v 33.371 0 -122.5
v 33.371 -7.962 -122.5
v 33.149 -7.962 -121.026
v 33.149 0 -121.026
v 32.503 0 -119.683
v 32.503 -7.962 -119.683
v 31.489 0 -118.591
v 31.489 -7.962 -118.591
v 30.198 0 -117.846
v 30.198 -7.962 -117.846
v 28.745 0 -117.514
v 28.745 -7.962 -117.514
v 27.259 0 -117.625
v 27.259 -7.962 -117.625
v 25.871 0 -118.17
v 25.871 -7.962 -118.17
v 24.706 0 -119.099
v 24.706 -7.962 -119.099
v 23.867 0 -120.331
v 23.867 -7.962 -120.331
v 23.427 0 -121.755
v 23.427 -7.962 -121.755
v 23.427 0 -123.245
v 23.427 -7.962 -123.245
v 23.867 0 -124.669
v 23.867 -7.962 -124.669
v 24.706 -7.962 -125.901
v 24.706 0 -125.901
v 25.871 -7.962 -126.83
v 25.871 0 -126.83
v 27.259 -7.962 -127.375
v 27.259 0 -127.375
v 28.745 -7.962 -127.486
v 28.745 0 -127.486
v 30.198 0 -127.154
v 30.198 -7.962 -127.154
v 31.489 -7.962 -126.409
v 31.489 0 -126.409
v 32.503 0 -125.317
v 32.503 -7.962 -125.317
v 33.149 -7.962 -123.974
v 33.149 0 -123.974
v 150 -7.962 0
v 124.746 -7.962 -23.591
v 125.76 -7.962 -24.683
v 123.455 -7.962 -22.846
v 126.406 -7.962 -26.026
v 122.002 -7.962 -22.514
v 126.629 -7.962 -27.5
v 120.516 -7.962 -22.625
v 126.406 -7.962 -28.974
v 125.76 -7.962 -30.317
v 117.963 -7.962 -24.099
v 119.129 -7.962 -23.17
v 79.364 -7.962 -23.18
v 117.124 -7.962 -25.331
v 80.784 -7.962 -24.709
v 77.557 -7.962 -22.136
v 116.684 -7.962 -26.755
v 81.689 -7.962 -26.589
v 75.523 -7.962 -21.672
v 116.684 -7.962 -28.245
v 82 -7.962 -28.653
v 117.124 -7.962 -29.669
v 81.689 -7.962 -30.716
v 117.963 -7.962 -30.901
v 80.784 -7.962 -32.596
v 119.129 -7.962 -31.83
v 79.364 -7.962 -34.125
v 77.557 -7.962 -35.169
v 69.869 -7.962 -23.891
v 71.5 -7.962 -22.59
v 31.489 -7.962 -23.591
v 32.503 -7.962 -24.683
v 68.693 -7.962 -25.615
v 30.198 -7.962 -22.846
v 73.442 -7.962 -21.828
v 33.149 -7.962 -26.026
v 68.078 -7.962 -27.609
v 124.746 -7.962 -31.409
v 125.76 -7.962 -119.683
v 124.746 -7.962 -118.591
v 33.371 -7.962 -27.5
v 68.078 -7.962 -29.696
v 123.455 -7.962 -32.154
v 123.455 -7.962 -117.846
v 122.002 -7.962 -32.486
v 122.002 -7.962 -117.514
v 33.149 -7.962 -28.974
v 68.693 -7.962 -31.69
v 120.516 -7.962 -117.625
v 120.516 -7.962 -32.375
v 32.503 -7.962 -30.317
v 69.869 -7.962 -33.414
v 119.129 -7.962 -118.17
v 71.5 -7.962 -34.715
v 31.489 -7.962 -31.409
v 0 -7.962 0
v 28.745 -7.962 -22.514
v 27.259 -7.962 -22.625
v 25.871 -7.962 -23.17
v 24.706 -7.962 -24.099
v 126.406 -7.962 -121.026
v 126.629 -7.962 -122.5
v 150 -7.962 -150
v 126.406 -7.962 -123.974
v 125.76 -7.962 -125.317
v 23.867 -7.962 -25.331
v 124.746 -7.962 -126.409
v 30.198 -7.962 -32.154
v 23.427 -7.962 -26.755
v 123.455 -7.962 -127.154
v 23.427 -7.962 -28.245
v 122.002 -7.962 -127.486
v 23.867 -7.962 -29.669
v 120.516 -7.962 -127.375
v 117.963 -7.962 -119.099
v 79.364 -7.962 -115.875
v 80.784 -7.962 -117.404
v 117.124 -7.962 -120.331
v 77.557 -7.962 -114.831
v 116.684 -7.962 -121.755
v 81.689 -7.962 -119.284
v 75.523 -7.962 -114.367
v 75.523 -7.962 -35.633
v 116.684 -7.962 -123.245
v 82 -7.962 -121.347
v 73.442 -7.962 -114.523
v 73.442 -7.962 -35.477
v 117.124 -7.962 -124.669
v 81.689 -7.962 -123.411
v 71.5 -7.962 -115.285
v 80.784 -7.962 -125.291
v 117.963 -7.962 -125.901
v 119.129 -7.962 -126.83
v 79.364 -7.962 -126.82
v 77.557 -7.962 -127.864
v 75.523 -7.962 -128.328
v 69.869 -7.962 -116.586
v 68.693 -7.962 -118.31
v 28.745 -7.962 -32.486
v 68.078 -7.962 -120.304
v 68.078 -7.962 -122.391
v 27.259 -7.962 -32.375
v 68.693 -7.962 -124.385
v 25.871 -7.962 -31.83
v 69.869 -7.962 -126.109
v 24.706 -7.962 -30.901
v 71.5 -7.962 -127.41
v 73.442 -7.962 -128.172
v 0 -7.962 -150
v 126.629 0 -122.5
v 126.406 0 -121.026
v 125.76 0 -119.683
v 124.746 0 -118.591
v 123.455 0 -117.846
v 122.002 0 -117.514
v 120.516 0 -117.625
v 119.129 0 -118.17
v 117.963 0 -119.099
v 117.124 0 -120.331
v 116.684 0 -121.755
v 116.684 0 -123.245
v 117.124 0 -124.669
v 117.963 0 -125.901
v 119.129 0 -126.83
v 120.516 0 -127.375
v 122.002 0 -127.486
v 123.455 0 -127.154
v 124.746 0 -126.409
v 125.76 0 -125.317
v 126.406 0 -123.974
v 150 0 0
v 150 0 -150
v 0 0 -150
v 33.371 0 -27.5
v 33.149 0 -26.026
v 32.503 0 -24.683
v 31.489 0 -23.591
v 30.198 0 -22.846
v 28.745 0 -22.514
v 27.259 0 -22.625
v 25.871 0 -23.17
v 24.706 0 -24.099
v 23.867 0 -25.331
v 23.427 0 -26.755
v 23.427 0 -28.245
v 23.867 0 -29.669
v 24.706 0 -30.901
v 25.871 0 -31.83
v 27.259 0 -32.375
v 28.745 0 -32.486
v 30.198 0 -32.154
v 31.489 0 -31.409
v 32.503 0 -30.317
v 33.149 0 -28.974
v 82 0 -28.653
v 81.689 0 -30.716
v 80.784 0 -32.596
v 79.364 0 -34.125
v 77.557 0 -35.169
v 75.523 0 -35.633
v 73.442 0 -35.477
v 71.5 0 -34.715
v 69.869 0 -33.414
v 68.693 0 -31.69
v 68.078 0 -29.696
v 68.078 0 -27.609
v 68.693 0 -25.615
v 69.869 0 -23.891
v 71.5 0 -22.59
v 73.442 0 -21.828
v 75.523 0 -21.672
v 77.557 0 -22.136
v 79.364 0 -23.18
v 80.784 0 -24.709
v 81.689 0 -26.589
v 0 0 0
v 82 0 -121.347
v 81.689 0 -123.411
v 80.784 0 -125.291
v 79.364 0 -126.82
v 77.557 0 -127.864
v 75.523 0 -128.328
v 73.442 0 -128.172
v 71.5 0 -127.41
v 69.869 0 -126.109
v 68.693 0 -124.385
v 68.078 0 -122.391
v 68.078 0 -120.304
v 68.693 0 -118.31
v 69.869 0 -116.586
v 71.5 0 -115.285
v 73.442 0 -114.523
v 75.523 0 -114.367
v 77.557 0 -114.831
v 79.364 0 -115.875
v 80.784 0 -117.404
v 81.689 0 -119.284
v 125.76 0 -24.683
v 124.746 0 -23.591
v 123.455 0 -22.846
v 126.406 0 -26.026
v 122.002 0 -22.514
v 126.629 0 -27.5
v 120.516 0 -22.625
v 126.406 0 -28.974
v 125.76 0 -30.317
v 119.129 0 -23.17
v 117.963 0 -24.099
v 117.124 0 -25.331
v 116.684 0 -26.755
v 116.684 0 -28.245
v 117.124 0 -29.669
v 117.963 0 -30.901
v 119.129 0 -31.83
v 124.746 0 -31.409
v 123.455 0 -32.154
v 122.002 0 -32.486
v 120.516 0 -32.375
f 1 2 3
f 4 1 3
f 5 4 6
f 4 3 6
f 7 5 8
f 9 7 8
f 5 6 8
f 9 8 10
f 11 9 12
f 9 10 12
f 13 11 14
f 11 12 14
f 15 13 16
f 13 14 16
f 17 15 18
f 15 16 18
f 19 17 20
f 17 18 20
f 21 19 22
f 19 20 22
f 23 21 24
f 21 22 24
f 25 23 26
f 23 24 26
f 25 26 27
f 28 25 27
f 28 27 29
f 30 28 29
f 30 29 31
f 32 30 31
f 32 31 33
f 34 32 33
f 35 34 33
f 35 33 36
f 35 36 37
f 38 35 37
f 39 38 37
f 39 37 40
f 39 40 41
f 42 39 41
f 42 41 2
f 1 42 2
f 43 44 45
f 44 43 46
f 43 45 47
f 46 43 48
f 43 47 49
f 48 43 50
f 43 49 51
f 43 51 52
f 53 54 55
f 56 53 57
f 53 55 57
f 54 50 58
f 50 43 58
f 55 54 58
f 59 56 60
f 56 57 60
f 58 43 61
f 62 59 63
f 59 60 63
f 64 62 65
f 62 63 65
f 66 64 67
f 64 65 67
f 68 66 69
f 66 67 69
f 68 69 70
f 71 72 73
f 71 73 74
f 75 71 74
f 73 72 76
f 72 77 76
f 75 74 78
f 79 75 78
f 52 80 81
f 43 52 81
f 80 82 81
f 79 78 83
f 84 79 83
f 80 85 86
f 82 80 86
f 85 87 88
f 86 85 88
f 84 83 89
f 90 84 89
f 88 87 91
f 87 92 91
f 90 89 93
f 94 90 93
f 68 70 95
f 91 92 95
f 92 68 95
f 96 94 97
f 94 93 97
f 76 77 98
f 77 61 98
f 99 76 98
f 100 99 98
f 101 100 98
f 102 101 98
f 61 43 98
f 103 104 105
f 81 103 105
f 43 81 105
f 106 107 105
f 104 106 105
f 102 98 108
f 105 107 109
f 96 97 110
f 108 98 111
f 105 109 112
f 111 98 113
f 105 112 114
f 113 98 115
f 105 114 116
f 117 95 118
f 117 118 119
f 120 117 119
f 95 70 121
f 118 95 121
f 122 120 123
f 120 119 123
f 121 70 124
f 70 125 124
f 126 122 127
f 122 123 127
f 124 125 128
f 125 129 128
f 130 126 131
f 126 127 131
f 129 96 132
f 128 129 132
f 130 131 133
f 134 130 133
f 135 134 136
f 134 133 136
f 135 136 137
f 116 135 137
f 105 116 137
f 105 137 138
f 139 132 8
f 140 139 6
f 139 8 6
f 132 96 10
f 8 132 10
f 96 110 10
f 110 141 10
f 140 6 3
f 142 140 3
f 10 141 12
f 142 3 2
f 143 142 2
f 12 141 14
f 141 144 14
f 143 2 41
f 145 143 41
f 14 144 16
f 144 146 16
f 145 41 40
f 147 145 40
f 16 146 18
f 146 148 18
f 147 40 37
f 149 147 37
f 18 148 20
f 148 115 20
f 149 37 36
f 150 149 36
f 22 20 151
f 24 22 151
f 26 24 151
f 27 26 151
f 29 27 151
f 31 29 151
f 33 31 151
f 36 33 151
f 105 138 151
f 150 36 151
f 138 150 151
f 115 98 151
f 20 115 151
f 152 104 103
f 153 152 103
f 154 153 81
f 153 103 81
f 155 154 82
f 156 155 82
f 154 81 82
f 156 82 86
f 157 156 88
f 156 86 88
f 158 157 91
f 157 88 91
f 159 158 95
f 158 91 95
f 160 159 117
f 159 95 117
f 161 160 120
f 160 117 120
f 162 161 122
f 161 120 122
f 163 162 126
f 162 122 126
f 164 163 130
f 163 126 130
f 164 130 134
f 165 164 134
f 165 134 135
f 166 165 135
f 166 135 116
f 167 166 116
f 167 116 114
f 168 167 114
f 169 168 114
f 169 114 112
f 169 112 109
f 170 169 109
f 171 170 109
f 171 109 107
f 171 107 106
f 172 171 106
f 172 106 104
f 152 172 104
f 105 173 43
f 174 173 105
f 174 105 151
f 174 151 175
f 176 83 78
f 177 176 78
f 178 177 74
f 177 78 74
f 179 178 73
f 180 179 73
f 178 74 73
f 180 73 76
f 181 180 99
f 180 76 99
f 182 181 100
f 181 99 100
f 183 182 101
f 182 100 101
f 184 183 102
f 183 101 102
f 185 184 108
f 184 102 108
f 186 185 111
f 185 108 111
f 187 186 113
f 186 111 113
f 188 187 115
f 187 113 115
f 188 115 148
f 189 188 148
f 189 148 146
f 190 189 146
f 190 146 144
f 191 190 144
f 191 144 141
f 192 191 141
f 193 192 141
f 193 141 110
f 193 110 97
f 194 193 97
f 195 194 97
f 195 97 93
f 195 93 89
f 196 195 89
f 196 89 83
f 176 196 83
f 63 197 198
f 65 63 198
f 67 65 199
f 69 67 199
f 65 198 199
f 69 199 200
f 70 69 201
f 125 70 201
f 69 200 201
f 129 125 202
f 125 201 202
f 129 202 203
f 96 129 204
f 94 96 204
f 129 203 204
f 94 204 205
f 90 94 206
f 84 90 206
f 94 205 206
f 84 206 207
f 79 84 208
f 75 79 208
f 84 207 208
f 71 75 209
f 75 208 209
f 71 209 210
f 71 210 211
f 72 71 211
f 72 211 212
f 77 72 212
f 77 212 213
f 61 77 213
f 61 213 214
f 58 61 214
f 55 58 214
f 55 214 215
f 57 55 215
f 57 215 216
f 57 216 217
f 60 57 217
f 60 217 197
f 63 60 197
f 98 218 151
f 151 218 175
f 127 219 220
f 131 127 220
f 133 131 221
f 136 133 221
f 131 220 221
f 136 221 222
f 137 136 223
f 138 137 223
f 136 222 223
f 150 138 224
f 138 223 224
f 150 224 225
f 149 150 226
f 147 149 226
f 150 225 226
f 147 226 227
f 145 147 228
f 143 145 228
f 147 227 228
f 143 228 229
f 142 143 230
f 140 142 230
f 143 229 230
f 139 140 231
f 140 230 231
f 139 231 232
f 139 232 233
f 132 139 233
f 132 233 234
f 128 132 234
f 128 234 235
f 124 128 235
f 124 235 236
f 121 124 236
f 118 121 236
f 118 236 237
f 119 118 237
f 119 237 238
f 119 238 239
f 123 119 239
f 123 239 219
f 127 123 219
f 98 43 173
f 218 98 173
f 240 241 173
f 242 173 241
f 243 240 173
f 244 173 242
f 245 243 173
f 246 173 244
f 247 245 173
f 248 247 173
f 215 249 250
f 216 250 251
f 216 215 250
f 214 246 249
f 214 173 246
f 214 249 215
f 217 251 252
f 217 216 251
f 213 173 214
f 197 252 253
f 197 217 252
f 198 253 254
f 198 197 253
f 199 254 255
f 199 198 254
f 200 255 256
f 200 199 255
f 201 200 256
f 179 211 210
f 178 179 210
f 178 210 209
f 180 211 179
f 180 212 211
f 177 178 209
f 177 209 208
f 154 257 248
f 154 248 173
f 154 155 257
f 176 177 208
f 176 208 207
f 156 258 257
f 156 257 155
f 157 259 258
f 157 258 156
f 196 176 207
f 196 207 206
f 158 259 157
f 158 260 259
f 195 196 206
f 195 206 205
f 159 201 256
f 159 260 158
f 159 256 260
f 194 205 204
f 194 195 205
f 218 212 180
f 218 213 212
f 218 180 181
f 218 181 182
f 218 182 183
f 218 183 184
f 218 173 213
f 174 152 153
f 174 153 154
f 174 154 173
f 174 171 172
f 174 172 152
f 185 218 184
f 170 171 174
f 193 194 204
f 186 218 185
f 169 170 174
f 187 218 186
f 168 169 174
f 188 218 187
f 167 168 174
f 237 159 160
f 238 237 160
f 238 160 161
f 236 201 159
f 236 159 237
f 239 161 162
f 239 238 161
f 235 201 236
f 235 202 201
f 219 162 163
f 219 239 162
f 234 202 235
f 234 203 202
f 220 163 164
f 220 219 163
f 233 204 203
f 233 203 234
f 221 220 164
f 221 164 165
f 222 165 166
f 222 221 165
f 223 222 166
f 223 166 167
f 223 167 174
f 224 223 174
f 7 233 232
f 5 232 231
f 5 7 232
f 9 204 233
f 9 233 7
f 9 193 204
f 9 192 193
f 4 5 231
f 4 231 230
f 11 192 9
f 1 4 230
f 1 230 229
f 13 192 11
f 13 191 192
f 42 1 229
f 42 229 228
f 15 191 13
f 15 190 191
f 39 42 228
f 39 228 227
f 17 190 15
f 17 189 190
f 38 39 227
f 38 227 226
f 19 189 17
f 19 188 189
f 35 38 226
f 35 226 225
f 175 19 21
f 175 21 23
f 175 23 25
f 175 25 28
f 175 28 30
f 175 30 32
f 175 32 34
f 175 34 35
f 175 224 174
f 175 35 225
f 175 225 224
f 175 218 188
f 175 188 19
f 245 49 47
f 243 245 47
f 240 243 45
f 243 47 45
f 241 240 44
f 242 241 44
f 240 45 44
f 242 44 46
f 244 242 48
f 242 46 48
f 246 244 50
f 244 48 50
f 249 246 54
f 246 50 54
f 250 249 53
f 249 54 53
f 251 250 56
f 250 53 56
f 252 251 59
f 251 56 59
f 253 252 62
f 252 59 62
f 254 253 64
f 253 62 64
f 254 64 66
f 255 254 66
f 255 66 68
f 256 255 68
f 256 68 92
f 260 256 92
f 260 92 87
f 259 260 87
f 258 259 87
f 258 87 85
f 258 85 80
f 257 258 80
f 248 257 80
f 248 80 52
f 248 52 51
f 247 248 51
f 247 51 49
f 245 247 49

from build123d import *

# Parameters (mm, degrees)
SKETCH1_W           = 150
SKETCH1_H           = 7.962213225
BOSS_EXTRUDE1_DEPTH = 150
SKETCH2_R           = 7
CUT_EXTRUDE1_DEPTH  = 8.962213225
SKETCH3_R           = 5
CUT_EXTRUDE2_DEPTH  = 8.962213225


with BuildPart() as part:
    # Sketch1 → Boss-Extrude1 (new body)
    with BuildSketch(Plane(origin=(0, 0, 0), x_dir=(0, 0, -1), z_dir=(1, 0, 0))):
        with Locations((75, -3.981106613)):
            Rectangle(SKETCH1_W, SKETCH1_H)
    extrude(amount=BOSS_EXTRUDE1_DEPTH)

    # Sketch2 → Cut-Extrude1 (cut, through all)
    with BuildSketch(Plane(origin=(0, 0, 0), x_dir=(1, 0, 0), z_dir=(0, 1, 0))):
        with Locations((74.999907539, 121.3473939)):
            Circle(SKETCH2_R)
        with Locations((74.999907539, 28.6526061)):
            Circle(SKETCH2_R)
    extrude(amount=-CUT_EXTRUDE1_DEPTH, mode=Mode.SUBTRACT)

    # Sketch3 → Cut-Extrude2 (cut, through all)
    with BuildSketch(Plane.XZ.offset(7.962213225)):
        with Locations((28.371496461, -122.5)):
            Circle(SKETCH3_R)
        with Locations((28.371496461, -27.5)):
            Circle(SKETCH3_R)
        with Locations((121.628503539, -27.5)):
            Circle(SKETCH3_R)
        with Locations((121.628503539, -122.5)):
            Circle(SKETCH3_R)
    extrude(amount=-CUT_EXTRUDE2_DEPTH, mode=Mode.SUBTRACT)


solid = part.part
